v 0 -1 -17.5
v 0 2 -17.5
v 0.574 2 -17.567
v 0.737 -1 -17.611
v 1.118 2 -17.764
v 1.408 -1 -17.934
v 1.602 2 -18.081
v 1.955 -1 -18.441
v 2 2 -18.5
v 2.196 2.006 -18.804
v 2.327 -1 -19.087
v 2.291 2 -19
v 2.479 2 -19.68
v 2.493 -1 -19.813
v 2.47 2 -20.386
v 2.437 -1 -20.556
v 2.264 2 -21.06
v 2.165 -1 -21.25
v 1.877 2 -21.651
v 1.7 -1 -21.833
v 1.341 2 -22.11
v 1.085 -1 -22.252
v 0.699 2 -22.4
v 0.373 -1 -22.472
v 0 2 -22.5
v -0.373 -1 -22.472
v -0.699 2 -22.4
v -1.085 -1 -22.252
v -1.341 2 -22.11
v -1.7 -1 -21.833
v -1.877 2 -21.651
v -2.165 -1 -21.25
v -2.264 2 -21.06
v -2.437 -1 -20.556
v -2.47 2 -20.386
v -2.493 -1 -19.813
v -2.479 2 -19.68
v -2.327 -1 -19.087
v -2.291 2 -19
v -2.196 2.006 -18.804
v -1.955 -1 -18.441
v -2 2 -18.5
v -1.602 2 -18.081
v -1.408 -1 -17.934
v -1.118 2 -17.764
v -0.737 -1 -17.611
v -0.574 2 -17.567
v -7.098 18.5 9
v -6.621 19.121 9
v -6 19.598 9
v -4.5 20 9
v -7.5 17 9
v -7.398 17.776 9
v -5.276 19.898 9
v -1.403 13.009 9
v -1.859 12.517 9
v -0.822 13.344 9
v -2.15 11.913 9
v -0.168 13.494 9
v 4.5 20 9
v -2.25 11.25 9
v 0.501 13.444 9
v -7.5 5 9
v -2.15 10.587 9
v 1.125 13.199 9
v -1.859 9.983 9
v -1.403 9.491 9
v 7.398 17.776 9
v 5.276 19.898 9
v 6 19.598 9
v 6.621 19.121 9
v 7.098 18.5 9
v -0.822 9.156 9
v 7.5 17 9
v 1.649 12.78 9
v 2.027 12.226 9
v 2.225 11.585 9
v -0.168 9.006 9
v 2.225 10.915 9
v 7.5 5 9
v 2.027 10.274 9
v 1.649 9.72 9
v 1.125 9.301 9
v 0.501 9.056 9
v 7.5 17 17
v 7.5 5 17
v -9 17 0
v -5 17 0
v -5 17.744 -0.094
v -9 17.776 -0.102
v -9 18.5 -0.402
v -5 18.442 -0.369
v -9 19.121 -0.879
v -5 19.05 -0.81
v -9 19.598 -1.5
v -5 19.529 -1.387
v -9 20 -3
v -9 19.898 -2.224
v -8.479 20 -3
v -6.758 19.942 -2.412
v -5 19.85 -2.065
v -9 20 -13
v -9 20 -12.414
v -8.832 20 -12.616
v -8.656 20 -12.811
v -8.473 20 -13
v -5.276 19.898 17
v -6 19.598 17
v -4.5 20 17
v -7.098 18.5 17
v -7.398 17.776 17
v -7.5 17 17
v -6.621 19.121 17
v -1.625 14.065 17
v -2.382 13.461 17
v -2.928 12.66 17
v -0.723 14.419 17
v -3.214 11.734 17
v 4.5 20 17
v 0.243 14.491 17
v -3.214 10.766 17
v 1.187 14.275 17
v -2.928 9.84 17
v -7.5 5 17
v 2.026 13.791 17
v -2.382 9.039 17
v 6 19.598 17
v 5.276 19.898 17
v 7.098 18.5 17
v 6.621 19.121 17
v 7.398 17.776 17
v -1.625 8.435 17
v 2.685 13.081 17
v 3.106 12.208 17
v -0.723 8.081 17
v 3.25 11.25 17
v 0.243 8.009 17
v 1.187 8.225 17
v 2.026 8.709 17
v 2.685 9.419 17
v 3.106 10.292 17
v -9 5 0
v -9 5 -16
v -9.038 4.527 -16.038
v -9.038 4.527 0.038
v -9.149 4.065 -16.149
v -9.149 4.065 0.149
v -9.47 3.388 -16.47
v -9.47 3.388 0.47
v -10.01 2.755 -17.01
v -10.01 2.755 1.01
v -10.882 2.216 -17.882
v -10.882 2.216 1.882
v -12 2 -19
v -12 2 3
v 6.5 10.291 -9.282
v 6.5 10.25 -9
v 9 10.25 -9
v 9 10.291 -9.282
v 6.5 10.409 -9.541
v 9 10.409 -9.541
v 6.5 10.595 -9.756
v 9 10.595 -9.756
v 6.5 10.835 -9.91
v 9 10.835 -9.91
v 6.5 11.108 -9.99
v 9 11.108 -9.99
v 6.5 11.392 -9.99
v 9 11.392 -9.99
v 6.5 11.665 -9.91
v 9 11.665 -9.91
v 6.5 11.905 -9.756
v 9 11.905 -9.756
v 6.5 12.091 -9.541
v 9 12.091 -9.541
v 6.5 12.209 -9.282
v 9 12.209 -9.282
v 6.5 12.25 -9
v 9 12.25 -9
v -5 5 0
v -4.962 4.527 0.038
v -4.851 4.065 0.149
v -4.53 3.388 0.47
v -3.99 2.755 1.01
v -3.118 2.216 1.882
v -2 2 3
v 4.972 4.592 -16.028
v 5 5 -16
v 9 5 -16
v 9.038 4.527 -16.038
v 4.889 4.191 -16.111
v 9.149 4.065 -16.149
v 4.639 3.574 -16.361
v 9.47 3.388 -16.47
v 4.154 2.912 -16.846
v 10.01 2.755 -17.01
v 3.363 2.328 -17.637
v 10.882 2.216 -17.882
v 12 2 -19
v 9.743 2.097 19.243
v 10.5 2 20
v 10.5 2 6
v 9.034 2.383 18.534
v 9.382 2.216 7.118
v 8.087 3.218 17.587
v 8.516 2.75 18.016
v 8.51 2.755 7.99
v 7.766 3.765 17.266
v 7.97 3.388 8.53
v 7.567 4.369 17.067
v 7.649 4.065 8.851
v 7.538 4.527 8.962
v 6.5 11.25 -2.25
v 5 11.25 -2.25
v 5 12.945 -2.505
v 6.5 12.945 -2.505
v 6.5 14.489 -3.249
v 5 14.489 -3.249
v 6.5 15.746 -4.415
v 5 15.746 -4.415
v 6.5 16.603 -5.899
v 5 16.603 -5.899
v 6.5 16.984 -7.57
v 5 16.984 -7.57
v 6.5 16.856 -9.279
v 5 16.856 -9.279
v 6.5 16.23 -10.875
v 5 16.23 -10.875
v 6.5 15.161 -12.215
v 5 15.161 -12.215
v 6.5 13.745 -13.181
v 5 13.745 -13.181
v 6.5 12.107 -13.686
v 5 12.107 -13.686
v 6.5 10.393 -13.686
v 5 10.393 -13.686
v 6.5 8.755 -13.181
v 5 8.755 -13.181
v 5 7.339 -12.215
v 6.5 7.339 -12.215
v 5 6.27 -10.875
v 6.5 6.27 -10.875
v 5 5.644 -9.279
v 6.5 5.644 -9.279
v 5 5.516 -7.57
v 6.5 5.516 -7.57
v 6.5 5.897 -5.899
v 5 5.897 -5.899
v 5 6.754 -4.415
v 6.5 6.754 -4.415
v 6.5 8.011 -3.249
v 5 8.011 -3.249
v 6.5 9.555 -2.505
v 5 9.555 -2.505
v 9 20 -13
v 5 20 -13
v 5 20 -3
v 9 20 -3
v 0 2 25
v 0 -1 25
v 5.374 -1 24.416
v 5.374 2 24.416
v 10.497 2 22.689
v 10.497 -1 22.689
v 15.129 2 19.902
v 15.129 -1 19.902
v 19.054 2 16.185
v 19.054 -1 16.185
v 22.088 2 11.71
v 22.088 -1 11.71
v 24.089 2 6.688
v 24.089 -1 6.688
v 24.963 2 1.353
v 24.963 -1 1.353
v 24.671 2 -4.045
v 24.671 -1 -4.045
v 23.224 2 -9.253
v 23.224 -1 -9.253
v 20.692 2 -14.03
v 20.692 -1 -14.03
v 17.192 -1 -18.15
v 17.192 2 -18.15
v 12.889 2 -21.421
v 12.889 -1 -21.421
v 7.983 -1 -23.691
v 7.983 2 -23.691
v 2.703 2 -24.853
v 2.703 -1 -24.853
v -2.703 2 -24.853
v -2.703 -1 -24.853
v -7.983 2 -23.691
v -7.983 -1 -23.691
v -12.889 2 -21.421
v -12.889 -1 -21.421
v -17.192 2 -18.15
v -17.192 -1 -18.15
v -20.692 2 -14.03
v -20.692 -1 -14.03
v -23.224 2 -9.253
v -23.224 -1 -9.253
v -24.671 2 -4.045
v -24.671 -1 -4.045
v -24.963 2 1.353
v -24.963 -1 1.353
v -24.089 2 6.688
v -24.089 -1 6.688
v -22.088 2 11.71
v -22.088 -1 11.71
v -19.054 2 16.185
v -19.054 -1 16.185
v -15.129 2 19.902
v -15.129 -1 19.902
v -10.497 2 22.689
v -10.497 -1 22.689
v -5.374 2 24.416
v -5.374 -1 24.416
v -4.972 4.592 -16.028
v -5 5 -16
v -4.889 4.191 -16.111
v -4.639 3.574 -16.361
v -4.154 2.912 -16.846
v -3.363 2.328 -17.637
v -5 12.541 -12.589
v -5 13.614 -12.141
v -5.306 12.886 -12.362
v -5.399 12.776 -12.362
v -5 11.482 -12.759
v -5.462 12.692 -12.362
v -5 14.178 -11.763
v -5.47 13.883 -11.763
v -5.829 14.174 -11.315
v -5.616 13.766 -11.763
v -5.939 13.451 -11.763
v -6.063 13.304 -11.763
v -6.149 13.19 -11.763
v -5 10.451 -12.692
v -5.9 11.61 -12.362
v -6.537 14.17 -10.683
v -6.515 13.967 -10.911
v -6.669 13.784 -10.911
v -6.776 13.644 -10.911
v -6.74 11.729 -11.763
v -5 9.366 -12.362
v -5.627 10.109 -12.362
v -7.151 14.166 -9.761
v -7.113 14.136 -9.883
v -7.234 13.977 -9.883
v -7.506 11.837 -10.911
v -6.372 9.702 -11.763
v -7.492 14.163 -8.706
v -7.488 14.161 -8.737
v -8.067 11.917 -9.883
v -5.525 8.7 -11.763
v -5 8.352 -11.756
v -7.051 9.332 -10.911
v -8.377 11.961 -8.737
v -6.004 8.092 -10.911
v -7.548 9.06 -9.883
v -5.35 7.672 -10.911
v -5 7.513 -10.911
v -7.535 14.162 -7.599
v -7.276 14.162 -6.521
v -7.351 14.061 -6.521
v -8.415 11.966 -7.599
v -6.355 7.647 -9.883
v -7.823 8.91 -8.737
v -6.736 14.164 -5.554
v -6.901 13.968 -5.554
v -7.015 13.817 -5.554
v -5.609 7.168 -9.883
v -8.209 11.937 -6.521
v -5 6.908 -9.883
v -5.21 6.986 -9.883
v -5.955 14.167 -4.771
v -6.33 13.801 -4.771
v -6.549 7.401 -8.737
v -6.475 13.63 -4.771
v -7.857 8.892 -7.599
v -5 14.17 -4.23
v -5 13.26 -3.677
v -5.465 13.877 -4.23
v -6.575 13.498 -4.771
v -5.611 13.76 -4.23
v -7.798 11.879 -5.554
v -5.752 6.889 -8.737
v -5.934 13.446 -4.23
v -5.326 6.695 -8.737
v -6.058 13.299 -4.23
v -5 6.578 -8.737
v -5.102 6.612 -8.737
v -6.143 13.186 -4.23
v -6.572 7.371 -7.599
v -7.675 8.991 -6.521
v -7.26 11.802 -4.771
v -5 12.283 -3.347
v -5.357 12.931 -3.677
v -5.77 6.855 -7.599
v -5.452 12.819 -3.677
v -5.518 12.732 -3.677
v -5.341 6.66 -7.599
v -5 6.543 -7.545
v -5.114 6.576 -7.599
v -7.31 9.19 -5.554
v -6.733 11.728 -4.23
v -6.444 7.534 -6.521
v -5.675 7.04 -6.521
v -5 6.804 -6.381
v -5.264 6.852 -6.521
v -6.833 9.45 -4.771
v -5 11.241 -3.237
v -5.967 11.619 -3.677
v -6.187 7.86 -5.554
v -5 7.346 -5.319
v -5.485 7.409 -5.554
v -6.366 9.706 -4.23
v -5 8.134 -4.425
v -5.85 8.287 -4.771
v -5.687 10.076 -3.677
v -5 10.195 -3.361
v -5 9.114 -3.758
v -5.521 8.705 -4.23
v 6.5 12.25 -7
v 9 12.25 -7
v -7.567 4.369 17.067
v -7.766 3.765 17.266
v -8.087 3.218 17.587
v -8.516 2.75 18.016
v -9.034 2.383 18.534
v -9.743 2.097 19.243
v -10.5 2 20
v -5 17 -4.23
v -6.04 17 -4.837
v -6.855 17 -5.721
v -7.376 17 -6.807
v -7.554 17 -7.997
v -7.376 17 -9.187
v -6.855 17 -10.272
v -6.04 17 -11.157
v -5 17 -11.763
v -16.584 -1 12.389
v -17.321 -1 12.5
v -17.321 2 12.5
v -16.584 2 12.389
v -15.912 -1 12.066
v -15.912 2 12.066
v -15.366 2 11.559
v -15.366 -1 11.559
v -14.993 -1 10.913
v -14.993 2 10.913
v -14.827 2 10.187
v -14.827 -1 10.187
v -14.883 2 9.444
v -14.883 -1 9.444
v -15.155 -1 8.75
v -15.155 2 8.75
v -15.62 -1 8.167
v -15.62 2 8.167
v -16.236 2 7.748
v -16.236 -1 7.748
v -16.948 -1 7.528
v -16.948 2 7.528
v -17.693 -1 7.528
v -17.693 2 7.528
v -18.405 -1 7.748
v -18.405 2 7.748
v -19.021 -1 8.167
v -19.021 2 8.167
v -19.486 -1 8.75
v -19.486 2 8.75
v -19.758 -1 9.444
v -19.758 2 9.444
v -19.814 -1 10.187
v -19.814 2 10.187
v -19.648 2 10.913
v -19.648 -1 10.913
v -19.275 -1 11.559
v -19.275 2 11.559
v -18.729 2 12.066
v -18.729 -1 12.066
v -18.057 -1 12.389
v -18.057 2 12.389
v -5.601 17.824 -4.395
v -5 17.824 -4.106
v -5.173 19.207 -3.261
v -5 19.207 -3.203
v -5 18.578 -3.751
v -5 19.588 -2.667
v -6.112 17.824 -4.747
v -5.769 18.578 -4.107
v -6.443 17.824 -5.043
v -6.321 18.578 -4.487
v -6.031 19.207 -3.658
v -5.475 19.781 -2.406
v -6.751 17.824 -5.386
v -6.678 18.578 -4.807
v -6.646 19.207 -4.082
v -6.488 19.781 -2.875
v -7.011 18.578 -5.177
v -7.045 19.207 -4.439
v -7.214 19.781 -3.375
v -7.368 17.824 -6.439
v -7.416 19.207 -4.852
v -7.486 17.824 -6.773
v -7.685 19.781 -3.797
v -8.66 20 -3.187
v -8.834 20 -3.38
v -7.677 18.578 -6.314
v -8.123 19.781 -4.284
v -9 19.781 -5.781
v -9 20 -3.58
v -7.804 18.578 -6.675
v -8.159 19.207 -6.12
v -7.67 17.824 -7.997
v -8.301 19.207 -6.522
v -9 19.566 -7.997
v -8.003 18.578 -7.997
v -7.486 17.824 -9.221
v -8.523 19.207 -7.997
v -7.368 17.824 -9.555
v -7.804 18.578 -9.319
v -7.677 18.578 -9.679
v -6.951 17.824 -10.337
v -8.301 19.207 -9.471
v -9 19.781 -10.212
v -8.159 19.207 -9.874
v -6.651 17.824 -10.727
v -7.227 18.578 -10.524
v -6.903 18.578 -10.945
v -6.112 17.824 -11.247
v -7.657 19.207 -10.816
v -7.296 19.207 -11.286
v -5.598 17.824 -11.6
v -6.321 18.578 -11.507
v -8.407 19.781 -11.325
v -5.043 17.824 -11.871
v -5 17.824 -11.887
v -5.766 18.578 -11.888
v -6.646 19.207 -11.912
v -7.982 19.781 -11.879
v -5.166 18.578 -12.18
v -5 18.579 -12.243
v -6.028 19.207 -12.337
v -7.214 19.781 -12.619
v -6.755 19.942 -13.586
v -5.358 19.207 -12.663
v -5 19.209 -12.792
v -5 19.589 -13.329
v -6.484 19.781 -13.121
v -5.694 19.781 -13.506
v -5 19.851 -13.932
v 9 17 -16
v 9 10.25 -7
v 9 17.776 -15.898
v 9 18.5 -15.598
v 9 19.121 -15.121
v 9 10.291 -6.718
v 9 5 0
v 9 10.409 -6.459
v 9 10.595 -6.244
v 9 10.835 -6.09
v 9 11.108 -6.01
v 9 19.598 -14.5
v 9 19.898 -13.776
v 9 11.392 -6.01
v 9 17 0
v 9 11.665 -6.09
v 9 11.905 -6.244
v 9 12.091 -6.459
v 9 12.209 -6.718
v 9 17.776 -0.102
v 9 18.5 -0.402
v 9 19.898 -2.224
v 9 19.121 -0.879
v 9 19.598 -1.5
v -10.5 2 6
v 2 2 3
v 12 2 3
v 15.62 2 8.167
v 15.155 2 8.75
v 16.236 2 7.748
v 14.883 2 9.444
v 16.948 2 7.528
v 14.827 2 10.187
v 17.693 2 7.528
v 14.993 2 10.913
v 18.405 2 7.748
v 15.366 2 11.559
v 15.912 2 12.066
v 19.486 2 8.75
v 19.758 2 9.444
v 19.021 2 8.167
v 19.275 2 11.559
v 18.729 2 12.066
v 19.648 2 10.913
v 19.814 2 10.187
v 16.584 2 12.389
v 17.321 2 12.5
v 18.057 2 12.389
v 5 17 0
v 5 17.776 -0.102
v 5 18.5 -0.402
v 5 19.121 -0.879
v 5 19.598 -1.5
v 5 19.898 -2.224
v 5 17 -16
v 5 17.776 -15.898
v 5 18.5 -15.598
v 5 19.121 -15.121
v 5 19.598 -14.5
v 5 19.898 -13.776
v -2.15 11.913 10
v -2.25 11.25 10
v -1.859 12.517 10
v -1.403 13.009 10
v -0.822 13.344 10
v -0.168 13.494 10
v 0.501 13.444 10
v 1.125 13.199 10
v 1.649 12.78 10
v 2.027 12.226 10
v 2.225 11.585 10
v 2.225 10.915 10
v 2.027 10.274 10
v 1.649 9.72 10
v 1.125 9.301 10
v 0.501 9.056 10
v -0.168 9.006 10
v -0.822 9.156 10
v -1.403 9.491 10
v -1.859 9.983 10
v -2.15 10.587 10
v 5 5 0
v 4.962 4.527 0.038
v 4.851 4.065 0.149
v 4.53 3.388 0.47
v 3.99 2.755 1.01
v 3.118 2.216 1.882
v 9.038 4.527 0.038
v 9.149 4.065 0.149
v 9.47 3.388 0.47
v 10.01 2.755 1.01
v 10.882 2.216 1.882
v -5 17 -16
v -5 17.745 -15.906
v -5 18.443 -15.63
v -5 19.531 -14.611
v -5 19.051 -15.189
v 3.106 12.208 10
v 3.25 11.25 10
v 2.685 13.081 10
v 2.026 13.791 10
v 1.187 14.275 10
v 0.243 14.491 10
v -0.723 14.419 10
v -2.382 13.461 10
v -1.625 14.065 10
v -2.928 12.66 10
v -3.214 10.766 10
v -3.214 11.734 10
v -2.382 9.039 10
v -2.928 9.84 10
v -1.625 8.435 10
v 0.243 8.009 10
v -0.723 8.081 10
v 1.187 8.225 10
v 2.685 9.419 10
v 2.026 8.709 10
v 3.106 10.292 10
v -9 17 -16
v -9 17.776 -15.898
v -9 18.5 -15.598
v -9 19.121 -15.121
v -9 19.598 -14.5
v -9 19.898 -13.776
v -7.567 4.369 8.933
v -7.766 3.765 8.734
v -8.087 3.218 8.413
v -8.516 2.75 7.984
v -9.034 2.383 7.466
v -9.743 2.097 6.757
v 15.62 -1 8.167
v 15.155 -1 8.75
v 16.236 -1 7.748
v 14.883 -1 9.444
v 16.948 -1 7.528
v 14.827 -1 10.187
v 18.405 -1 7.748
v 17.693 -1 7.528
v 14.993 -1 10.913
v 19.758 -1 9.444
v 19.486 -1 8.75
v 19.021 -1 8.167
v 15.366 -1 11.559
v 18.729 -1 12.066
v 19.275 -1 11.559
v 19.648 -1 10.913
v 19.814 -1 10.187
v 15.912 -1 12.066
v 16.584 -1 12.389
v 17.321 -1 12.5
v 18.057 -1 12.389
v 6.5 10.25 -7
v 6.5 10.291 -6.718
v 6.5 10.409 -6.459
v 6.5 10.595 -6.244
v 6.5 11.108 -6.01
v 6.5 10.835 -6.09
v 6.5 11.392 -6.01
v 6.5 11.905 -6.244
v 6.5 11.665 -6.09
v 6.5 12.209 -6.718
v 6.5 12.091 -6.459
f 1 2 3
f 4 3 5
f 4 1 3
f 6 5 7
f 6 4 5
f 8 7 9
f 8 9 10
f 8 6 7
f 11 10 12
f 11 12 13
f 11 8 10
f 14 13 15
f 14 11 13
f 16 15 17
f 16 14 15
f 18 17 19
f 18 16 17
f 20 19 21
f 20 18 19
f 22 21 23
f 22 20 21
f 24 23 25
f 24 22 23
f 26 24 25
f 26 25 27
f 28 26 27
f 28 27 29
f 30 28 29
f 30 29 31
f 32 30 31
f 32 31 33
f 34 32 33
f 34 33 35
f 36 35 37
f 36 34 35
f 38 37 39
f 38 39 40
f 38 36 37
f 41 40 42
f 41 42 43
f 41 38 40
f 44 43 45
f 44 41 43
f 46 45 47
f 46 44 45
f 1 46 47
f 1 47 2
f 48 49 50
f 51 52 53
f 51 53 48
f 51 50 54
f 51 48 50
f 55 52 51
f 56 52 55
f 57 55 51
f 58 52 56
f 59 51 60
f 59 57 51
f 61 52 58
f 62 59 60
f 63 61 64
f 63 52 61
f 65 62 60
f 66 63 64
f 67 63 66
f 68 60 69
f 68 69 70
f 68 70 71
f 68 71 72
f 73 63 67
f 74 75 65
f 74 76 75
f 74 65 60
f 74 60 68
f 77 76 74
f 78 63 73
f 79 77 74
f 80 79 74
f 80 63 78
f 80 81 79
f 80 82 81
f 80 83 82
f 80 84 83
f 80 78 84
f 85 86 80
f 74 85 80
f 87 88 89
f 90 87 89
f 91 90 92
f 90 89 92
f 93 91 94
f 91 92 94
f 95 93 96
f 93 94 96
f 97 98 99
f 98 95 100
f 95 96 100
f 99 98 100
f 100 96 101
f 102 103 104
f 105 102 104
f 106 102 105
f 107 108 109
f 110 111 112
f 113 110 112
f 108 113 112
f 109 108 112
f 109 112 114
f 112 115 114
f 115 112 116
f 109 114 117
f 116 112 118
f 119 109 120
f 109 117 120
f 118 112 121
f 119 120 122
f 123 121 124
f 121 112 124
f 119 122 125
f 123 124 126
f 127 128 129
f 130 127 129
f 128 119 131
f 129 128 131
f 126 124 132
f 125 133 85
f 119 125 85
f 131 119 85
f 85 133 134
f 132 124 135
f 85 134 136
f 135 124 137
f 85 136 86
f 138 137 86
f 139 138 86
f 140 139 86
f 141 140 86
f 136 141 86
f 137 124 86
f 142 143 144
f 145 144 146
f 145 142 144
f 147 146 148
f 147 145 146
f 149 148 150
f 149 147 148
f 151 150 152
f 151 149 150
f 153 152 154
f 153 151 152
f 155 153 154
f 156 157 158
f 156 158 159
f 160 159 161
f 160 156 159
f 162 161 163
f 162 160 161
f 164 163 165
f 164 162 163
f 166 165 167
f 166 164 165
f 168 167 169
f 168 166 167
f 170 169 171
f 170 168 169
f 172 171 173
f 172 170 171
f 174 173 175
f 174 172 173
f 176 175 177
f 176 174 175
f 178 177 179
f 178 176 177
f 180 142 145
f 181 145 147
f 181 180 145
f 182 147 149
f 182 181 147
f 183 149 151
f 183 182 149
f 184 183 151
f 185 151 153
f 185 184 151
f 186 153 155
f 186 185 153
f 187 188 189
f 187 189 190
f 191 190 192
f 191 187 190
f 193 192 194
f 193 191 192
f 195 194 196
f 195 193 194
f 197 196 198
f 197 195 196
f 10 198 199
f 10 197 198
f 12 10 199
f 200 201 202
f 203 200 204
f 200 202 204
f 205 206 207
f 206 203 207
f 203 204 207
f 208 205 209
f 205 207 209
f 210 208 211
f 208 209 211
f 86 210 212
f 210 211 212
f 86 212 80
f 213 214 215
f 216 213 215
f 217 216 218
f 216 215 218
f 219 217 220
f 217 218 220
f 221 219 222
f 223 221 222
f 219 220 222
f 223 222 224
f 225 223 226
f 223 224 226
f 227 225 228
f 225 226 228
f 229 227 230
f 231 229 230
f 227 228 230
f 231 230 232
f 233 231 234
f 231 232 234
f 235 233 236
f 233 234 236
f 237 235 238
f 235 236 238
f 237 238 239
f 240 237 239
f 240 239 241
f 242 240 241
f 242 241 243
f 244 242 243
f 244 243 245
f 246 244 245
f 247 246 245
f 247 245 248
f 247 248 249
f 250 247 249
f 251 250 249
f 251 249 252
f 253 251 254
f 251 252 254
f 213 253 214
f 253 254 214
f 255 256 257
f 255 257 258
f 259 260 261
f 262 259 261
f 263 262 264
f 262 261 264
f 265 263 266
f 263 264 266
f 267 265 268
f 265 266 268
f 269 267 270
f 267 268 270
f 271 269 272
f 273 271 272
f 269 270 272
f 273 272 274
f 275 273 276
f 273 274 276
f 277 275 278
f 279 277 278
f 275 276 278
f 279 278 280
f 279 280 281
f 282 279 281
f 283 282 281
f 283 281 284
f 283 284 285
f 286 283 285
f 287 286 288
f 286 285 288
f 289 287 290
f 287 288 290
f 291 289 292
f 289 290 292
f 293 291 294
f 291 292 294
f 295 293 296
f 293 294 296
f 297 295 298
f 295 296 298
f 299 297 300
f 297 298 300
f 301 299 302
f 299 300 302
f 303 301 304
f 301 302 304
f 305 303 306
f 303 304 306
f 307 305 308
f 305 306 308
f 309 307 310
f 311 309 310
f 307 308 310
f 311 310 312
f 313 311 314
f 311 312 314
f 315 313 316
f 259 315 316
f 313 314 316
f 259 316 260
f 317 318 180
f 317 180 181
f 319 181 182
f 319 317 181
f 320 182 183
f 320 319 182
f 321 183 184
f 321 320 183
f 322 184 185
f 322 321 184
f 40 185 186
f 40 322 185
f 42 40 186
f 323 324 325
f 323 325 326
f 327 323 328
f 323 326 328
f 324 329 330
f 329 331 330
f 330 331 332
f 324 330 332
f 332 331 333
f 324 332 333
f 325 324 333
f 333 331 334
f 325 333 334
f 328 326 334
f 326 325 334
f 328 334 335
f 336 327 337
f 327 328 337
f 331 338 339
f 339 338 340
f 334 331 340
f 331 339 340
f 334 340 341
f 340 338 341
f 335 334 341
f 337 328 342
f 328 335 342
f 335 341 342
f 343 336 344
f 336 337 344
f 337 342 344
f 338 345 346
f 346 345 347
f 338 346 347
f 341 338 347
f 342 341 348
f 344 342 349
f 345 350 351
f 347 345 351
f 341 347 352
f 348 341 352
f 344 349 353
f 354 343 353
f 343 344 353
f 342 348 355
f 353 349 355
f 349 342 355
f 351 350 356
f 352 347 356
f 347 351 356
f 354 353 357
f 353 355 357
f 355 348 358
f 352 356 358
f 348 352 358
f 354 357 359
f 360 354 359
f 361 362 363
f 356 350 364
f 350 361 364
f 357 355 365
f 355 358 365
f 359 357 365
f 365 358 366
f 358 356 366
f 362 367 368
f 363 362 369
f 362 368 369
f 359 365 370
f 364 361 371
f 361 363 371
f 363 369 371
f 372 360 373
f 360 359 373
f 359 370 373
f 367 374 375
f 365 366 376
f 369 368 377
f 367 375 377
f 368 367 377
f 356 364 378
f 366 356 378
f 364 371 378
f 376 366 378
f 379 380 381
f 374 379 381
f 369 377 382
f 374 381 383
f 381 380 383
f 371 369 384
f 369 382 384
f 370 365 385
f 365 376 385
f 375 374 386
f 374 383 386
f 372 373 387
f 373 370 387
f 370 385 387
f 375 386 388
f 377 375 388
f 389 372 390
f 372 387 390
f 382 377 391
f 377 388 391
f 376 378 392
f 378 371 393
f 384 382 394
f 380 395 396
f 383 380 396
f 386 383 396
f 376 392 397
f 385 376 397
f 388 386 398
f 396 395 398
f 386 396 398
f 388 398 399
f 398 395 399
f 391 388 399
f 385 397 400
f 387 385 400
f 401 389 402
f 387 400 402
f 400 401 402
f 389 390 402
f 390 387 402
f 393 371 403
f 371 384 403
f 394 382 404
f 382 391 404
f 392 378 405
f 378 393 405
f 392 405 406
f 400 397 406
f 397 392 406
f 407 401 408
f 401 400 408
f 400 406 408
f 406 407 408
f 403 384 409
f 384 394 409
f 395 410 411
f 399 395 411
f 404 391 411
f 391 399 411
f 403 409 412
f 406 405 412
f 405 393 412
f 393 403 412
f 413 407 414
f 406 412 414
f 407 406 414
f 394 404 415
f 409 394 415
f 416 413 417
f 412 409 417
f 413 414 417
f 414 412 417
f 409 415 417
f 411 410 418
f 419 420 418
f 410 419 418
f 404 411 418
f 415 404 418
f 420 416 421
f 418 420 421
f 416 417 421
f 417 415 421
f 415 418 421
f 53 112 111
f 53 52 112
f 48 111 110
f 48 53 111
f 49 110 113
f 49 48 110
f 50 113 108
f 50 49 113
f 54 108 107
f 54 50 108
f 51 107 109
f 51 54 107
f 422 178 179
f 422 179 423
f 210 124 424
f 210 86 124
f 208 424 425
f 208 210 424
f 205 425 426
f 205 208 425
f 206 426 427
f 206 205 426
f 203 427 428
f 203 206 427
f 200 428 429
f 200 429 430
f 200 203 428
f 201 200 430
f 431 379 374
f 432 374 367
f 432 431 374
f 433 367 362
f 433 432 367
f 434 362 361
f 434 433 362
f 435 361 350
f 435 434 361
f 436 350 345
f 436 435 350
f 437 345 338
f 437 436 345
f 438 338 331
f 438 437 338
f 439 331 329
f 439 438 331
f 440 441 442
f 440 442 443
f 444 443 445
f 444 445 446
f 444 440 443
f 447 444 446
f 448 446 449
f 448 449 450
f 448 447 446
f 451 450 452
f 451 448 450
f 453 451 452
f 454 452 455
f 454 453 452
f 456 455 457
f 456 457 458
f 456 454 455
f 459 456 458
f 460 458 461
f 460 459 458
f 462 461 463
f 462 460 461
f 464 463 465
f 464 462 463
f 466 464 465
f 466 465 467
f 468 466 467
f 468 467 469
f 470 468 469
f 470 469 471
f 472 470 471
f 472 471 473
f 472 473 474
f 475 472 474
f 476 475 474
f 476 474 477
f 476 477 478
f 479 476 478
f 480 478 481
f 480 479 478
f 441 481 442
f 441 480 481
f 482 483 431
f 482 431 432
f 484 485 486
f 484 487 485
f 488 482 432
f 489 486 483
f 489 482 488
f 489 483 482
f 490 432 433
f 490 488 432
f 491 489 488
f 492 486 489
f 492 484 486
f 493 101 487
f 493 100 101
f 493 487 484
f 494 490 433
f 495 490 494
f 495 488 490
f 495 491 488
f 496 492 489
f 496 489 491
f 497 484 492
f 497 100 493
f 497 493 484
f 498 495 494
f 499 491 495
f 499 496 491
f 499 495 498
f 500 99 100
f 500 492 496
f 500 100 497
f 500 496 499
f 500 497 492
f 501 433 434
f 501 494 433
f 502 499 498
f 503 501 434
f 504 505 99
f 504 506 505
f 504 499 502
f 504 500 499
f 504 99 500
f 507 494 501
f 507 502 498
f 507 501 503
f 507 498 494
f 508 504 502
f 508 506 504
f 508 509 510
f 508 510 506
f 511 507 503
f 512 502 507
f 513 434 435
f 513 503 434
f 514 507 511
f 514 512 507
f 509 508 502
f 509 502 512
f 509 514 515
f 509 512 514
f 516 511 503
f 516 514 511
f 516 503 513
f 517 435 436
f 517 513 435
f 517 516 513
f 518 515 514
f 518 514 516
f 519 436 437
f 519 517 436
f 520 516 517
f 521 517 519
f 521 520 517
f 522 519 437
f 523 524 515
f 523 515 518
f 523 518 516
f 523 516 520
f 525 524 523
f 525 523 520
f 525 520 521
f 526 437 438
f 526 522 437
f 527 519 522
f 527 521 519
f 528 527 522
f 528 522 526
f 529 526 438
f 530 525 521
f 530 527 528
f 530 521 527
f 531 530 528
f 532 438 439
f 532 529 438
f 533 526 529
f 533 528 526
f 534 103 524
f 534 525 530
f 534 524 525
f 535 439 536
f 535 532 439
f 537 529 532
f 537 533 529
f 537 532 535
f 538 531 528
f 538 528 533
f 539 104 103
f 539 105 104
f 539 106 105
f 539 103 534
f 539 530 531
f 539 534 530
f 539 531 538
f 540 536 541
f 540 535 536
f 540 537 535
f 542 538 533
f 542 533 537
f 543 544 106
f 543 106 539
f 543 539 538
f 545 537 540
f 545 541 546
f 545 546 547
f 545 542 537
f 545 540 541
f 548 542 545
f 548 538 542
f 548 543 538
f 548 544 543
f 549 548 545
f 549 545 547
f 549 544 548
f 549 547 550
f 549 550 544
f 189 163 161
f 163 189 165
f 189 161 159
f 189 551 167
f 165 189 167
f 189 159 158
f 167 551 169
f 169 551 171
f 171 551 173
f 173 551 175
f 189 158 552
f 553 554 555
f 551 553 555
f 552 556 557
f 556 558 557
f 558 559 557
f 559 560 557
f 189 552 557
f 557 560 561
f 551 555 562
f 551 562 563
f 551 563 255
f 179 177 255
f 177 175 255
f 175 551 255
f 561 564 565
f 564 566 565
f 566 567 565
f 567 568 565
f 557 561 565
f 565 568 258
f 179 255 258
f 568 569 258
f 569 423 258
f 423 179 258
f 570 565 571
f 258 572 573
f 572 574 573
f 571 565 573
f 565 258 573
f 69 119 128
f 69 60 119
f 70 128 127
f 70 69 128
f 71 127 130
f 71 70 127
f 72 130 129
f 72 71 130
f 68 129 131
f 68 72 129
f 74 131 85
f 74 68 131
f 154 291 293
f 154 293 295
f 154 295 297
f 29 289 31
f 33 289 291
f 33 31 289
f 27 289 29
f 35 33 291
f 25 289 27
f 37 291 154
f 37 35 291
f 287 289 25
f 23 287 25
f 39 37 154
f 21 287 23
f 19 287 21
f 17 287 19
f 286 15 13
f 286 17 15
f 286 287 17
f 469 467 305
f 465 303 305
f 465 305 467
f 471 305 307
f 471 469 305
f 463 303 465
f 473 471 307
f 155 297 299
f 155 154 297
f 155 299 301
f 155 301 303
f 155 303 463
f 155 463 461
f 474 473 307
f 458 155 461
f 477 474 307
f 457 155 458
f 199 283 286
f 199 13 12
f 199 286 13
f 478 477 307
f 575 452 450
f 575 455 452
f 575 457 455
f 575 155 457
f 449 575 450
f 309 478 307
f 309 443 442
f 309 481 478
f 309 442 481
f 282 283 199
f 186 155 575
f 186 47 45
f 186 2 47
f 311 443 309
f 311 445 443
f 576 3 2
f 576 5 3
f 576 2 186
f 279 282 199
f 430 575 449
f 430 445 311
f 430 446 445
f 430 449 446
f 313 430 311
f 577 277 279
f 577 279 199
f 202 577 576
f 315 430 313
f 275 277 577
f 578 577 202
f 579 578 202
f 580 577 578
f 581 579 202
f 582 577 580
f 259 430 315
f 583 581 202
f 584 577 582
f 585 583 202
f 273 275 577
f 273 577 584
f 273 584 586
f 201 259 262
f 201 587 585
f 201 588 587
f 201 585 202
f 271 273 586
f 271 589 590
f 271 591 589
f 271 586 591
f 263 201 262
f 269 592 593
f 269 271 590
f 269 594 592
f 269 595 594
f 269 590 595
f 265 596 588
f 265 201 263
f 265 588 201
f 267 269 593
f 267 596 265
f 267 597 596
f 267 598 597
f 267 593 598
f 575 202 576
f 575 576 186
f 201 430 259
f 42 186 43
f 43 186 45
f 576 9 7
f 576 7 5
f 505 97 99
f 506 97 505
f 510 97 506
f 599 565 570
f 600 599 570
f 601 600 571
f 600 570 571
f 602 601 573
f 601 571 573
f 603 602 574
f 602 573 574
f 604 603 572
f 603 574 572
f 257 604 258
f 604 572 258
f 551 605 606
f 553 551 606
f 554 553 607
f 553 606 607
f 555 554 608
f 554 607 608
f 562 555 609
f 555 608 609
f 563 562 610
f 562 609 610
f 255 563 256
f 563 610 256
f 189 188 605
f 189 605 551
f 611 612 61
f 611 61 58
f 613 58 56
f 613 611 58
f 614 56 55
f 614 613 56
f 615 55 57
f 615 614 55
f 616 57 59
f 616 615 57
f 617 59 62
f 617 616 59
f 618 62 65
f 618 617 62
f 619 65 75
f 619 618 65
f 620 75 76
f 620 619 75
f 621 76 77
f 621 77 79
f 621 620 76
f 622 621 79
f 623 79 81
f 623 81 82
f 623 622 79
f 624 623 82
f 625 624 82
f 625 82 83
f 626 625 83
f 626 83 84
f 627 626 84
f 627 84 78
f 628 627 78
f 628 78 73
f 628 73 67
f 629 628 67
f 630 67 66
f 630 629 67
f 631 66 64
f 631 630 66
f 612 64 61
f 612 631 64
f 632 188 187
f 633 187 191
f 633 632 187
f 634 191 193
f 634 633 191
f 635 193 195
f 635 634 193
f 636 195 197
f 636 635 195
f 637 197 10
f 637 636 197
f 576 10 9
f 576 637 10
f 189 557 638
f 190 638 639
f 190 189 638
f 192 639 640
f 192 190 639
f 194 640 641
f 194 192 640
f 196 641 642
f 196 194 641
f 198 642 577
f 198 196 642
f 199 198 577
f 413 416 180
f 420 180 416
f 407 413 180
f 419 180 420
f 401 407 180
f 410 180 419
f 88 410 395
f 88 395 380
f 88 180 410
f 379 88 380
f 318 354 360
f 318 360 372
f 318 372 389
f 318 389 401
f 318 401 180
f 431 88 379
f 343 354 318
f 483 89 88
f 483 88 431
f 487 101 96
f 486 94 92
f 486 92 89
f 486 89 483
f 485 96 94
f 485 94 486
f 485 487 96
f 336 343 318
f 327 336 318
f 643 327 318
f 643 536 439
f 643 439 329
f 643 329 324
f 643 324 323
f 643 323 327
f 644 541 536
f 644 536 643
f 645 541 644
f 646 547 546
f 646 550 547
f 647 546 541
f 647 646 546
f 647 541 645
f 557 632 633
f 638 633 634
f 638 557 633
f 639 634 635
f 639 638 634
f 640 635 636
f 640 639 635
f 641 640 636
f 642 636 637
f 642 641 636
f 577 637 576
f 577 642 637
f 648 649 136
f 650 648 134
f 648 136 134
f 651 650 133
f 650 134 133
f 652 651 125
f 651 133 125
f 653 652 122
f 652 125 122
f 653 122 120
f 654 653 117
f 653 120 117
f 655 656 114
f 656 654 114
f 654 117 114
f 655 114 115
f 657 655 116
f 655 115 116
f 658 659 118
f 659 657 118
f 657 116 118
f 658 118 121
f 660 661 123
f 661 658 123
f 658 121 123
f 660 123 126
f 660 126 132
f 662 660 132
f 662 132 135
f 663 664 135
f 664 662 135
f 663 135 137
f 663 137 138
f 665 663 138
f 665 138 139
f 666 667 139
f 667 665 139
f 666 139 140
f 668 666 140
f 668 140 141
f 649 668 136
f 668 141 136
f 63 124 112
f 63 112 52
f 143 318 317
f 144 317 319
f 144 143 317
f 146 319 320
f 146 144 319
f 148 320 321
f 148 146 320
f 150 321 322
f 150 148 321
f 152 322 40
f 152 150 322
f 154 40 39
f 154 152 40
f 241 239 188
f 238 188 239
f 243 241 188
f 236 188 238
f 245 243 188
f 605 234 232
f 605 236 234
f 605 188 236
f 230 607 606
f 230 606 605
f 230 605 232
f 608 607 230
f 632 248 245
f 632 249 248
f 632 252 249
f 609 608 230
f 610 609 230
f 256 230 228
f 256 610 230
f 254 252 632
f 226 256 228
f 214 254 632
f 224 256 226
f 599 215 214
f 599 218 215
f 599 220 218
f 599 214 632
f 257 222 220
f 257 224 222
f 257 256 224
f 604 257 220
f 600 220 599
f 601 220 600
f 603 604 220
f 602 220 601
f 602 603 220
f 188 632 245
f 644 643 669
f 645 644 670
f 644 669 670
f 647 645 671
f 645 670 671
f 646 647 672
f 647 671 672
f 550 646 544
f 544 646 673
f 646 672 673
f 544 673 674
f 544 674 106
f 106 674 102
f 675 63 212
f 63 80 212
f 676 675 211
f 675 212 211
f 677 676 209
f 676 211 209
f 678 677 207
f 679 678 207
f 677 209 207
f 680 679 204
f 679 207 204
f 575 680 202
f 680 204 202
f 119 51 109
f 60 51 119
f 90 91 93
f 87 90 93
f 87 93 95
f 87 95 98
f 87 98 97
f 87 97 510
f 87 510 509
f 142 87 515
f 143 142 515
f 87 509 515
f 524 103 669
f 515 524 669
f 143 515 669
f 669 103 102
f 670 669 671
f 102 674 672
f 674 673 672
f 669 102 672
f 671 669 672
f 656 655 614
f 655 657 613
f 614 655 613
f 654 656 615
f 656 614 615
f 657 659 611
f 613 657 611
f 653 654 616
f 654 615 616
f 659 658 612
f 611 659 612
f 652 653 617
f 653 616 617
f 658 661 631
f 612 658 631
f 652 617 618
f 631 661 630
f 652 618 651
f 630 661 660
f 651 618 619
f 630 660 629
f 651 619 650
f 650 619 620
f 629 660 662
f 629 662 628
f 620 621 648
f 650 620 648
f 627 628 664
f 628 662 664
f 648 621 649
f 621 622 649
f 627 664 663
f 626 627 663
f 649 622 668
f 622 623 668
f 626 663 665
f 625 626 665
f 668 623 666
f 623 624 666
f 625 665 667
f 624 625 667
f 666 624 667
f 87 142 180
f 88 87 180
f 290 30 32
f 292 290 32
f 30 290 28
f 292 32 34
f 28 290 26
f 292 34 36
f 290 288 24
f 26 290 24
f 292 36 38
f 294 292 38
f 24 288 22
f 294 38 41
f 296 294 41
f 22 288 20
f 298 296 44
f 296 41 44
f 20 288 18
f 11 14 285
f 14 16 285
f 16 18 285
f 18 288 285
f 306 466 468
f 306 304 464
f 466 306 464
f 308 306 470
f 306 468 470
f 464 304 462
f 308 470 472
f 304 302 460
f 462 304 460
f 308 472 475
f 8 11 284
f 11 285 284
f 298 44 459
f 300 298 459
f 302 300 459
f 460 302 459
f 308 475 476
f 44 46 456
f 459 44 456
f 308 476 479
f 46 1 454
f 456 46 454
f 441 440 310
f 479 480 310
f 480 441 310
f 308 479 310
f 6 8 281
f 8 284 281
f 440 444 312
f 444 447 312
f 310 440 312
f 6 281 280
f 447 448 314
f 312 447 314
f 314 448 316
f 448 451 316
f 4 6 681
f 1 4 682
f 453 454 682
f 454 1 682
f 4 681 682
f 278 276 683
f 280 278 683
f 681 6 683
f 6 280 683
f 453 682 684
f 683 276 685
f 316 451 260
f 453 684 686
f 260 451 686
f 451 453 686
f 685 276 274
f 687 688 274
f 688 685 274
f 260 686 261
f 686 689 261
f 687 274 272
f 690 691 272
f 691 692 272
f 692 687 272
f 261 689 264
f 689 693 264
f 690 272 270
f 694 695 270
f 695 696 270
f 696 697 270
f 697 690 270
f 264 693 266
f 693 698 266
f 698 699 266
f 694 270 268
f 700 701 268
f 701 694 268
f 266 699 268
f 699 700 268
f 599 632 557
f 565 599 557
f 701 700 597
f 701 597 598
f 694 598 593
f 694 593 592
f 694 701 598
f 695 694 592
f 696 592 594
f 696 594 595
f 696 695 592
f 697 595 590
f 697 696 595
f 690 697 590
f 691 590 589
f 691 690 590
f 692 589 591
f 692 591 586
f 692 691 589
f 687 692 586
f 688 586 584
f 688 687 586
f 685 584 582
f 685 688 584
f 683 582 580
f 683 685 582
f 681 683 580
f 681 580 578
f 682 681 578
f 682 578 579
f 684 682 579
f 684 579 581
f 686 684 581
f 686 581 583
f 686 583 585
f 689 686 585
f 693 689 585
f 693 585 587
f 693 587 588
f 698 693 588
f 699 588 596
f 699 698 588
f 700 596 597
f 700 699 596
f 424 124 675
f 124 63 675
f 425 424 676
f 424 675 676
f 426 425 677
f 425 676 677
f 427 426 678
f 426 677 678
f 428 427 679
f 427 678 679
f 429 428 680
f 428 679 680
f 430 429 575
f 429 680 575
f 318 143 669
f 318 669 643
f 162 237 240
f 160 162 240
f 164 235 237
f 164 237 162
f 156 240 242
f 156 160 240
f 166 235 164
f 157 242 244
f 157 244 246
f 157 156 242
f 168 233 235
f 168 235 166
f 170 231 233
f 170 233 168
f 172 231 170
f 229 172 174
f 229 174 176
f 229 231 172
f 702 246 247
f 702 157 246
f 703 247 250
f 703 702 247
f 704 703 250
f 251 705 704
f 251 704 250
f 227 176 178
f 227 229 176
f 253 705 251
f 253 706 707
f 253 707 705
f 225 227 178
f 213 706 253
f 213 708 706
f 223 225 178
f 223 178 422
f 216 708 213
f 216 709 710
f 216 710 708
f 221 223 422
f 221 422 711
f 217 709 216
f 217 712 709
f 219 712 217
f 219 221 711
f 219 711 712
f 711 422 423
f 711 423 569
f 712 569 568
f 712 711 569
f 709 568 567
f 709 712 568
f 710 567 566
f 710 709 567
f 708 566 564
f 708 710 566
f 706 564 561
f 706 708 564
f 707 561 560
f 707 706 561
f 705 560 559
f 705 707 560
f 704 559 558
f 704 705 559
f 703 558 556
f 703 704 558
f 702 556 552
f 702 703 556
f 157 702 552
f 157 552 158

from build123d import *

# Parameters (mm, degrees)
BOSS_EXTRUDE1_DEPTH      = 2
BOSS_EXTRUDE1_DEPTH_BACK = 1
SKETCH1_R                = 25
SKETCH1_R_2              = 2.5
SKETCH2_W                = 4
SKETCH2_H                = 16
BOSS_EXTRUDE2_DEPTH      = 18
SKETCH3_R                = 5.75
CUT_EXTRUDE1_DEPTH       = 1.5
CUT_REVOLVE1_ANGLE       = 180
CUT_EXTRUDE2_REACH       = 43.122
CUT_EXTRUDE3_REACH       = 46.914
FILLET1_R                = 3
SKETCH7_W                = 15
SKETCH7_H                = 8
BOSS_EXTRUDE3_DEPTH      = 18
CUT_EXTRUDE4_REACH       = 54.811
SKETCH8_R                = 3.25
BOSS_EXTRUDE4_START      = -1
SKETCH9_R                = 3.25
SKETCH9_R_2              = 2.25
BOSS_EXTRUDE4_DEPTH      = 1
FILLET2_R                = 3


with BuildPart() as part:
    # Sketch1 → Boss-Extrude1 (new, two sides: drawn at the far end of the back side and taken through both)
    with BuildSketch(Plane(origin=(0, 0, 0), x_dir=(1, 0, 0), z_dir=(0, 1, 0)).offset(-BOSS_EXTRUDE1_DEPTH_BACK)):
        with Locations(Location((0, 0, 0), (0, 0, 270))):
            Circle(SKETCH1_R)
        with Locations(Location((0, 20, 0), (0, 0, 270))):
            Circle(SKETCH1_R_2, mode=Mode.SUBTRACT)
        with Locations(Location((17.320508076, -10, 0), (0, 0, 270))):
            Circle(SKETCH1_R_2, mode=Mode.SUBTRACT)
        with Locations(Location((-17.320508076, -10, 0), (0, 0, 270))):
            Circle(SKETCH1_R_2, mode=Mode.SUBTRACT)
    extrude(amount=BOSS_EXTRUDE1_DEPTH + BOSS_EXTRUDE1_DEPTH_BACK)

    # Sketch2 → Boss-Extrude2 (add)
    with BuildSketch(Plane(origin=(0, 2, 0), x_dir=(1, 0, 0), z_dir=(0, 1, 0))):
        with Locations((7, 8)):
            Rectangle(SKETCH2_W, SKETCH2_H)
        with Locations((-7, 8)):
            Rectangle(SKETCH2_W, SKETCH2_H)
    extrude(amount=BOSS_EXTRUDE2_DEPTH)

    # Sketch3 → Cut-Extrude1 (cut)
    with BuildSketch(Plane.ZY.offset(-5)):
        with Locations((-8, 11.25)):
            Circle(SKETCH3_R)
    extrude(amount=-CUT_EXTRUDE1_DEPTH, mode=Mode.SUBTRACT)

    # Sketch4 → Cut-Revolve1 (revolve, cut)
    with BuildSketch(Plane.ZY.offset(3.5)):
        with BuildLine():
            Line((-3.000039219, 11.269803747), (-12.999960781, 11.269803747))
            ThreePointArc((-12.999960781, 11.269803747), (-8, 16.25), (-3.000039219, 11.269803747))
        make_face()
    revolve(axis=Axis((-3.5, 11.269803747, -3.000039219), (0, 0, 1)), revolution_arc=CUT_REVOLVE1_ANGLE, mode=Mode.SUBTRACT)

    # Sketch5 → Cut-Extrude2 (cut, up to next)
    with BuildSketch(Plane(origin=(0, 20, 0), x_dir=(1, 0, 0), z_dir=(0, 1, 0)), mode=Mode.PRIVATE) as cut_extrude2_sk1:
        with BuildLine():
            Line((-5, 11.763417337), (-5, 4.230303993))
            ThreePointArc((-5, 4.230303993), (-7.554250753, 7.996860665), (-5, 11.763417337))
        make_face()
    cut_extrude2_tool1 = extrude(cut_extrude2_sk1.sketch, amount=-CUT_EXTRUDE2_REACH, mode=Mode.PRIVATE) & part.part
    add(cut_extrude2_tool1.solids().sort_by_distance((-6.055552, 20, -7.996861))[0], mode=Mode.SUBTRACT)

    # Sketch6 → Cut-Extrude3 (cut, up to next)
    with BuildSketch(Plane.ZY.offset(-6.5), mode=Mode.PRIVATE) as cut_extrude3_sk1:
        with BuildLine():
            Line((-9, 12.25), (-7, 12.25))
            ThreePointArc((-7, 12.25), (-6, 11.25), (-7, 10.25))
            Line((-7, 10.25), (-9, 10.25))
            ThreePointArc((-9, 10.25), (-10, 11.25), (-9, 12.25))
        make_face()
    cut_extrude3_tool1 = extrude(cut_extrude3_sk1.sketch, amount=-CUT_EXTRUDE3_REACH, mode=Mode.PRIVATE) & part.part
    add(cut_extrude3_tool1.solids().sort_by_distance((6.5, 11.25, -8))[0], mode=Mode.SUBTRACT)

    # Fillet1
    # the kernel refuses this fillet: 3 mm, written as the material it adds along each edge
    with BuildSketch(Plane(origin=(5, 2, -16), x_dir=(0, 0, -1), z_dir=(1, 0, 0)), Plane(origin=(-9, 2, -16), x_dir=(0, 0, -1), z_dir=(1, 0, 0)), Plane(origin=(9, 2, 0), x_dir=(0, 0, 1), z_dir=(-1, 0, 0)), Plane(origin=(-5, 2, 0), x_dir=(0, 0, 1), z_dir=(-1, 0, 0))) as fillet1_piece_1:
        with BuildLine():
            CenterArc((FILLET1_R, FILLET1_R), FILLET1_R, 180, 90)
            Line((0, FILLET1_R), (0, 0))
            Line((0, 0), (FILLET1_R, 0))
        make_face()
    extrude(amount=4)
    with BuildSketch(Plane(origin=(9, 2, -16), x_dir=(1, 0, 0), z_dir=(0, 0, 1)), Plane(origin=(5, 2, 0), x_dir=(-1, 0, 0), z_dir=(0, 0, -1)), Plane(origin=(-5, 2, -16), x_dir=(1, 0, 0), z_dir=(0, 0, 1)), Plane(origin=(-9, 2, 0), x_dir=(-1, 0, 0), z_dir=(0, 0, -1))) as fillet1_piece_2:
        with BuildLine():
            CenterArc((FILLET1_R, FILLET1_R), FILLET1_R, 180, 90)
            Line((0, FILLET1_R), (0, 0))
            Line((0, 0), (FILLET1_R, 0))
        make_face()
    extrude(amount=16)
    with BuildSketch(Plane(origin=(-2.5, 2, -16), x_dir=(0, 0, -1), z_dir=(1, 0, 0))) as fillet1_piece_3a_section:
        with BuildLine():
            CenterArc((FILLET1_R, FILLET1_R), FILLET1_R, 180, 90)
            Line((0, FILLET1_R), (0, 0))
            Line((0, 0), (FILLET1_R, 0))
        make_face()
    fillet1_piece_3a = extrude(amount=11.5, mode=Mode.PRIVATE)
    fillet1_piece_3a = fillet1_piece_3a - Plane(origin=(0, 2.708264554, -20), x_dir=(0, 0, 1), z_dir=(0, -1, 0)) * Cylinder(2.5, 35, mode=Mode.PRIVATE)
    fillet1_piece_3a = split(fillet1_piece_3a, bisect_by=Plane(origin=(5, 2.708264554, -16.611938718), z_dir=(-1, 0, 0)), keep=Keep.TOP, mode=Mode.PRIVATE)
    with BuildSketch(Plane(origin=(5, 2, 0), x_dir=(-1, 0, 0), z_dir=(0, 0, -1))) as fillet1_piece_3b_section:
        with BuildLine():
            CenterArc((FILLET1_R, FILLET1_R), FILLET1_R, 180, 90)
            Line((0, FILLET1_R), (0, 0))
            Line((0, 0), (FILLET1_R, 0))
        make_face()
    fillet1_piece_3b = extrude(amount=23.5, mode=Mode.PRIVATE)
    fillet1_piece_3b = fillet1_piece_3b - Plane(origin=(0, 2.682108515, -20), x_dir=(0, 0, 1), z_dir=(0, -1, 0)) * Cylinder(2.5, 59, mode=Mode.PRIVATE)
    fillet1_piece_3b = split(fillet1_piece_3b, bisect_by=Plane(origin=(4.329541602, 2.682108515, -16), z_dir=(0, 0, -1)), keep=Keep.TOP, mode=Mode.PRIVATE)
    fillet1_piece_3 = fillet1_piece_3a & fillet1_piece_3b
    add(fillet1_piece_3)
    with BuildSketch(Plane(origin=(9, 2, -23.5), x_dir=(1, 0, 0), z_dir=(0, 0, 1))) as fillet1_piece_4a_section:
        with BuildLine():
            CenterArc((FILLET1_R, FILLET1_R), FILLET1_R, 180, 90)
            Line((0, FILLET1_R), (0, 0))
            Line((0, 0), (FILLET1_R, 0))
        make_face()
    fillet1_piece_4a = extrude(amount=23.5, mode=Mode.PRIVATE)
    fillet1_piece_4a = fillet1_piece_4a & Plane(origin=(0, 2.69431261, 0), x_dir=(0, 0, 1), z_dir=(0, -1, 0)) * Cylinder(25, 59, mode=Mode.PRIVATE)
    fillet1_piece_4a = split(fillet1_piece_4a, bisect_by=Plane(origin=(9.653084962, 2.69431261, -16), z_dir=(0, 0, -1)), keep=Keep.TOP, mode=Mode.PRIVATE)
    with BuildSketch(Plane(origin=(5, 2, -16), x_dir=(0, 0, -1), z_dir=(1, 0, 0))) as fillet1_piece_4b_section:
        with BuildLine():
            CenterArc((FILLET1_R, FILLET1_R), FILLET1_R, 180, 90)
            Line((0, FILLET1_R), (0, 0))
            Line((0, 0), (FILLET1_R, 0))
        make_face()
    fillet1_piece_4b = extrude(amount=11.5, mode=Mode.PRIVATE)
    fillet1_piece_4b = fillet1_piece_4b & Plane(origin=(0, 2.679254462, 0), x_dir=(0, 0, 1), z_dir=(0, -1, 0)) * Cylinder(25, 35, mode=Mode.PRIVATE)
    fillet1_piece_4b = split(fillet1_piece_4b, bisect_by=Plane(origin=(9, 2.679254462, -16.678966139), z_dir=(1, 0, 0)), keep=Keep.TOP, mode=Mode.PRIVATE)
    fillet1_piece_4 = fillet1_piece_4a & fillet1_piece_4b
    add(fillet1_piece_4)
    with BuildSketch(Plane(origin=(9, 2, -16), x_dir=(1, 0, 0), z_dir=(0, 0, 1))) as fillet1_piece_5a_section:
        with BuildLine():
            CenterArc((FILLET1_R, FILLET1_R), FILLET1_R, 180, 90)
            Line((0, FILLET1_R), (0, 0))
            Line((0, 0), (FILLET1_R, 0))
        make_face()
    fillet1_piece_5a = extrude(amount=23.5, mode=Mode.PRIVATE)
    fillet1_piece_5a = split(fillet1_piece_5a, bisect_by=Plane(origin=(9.679185343, 2.679185343, 0), z_dir=(0, 0, 1)), keep=Keep.TOP, mode=Mode.PRIVATE)
    with BuildSketch(Plane(origin=(16.5, 2, 0), x_dir=(0, 0, 1), z_dir=(-1, 0, 0))) as fillet1_piece_5b_section:
        with BuildLine():
            CenterArc((FILLET1_R, FILLET1_R), FILLET1_R, 180, 90)
            Line((0, FILLET1_R), (0, 0))
            Line((0, 0), (FILLET1_R, 0))
        make_face()
    fillet1_piece_5b = extrude(amount=11.5, mode=Mode.PRIVATE)
    fillet1_piece_5b = split(fillet1_piece_5b, bisect_by=Plane(origin=(9, 2.679185343, 0.679185343), z_dir=(1, 0, 0)), keep=Keep.TOP, mode=Mode.PRIVATE)
    fillet1_piece_5 = fillet1_piece_5a & fillet1_piece_5b
    add(fillet1_piece_5)
    with BuildSketch(Plane(origin=(5, 2, 7.5), x_dir=(-1, 0, 0), z_dir=(0, 0, -1))) as fillet1_piece_6a_section:
        with BuildLine():
            CenterArc((FILLET1_R, FILLET1_R), FILLET1_R, 180, 90)
            Line((0, FILLET1_R), (0, 0))
            Line((0, 0), (FILLET1_R, 0))
        make_face()
    fillet1_piece_6a = extrude(amount=23.5, mode=Mode.PRIVATE)
    fillet1_piece_6a = split(fillet1_piece_6a, bisect_by=Plane(origin=(4.320814657, 2.679185343, 0), z_dir=(0, 0, 1)), keep=Keep.TOP, mode=Mode.PRIVATE)
    with BuildSketch(Plane(origin=(9, 2, 0), x_dir=(0, 0, 1), z_dir=(-1, 0, 0))) as fillet1_piece_6b_section:
        with BuildLine():
            CenterArc((FILLET1_R, FILLET1_R), FILLET1_R, 180, 90)
            Line((0, FILLET1_R), (0, 0))
            Line((0, 0), (FILLET1_R, 0))
        make_face()
    fillet1_piece_6b = extrude(amount=11.5, mode=Mode.PRIVATE)
    fillet1_piece_6b = split(fillet1_piece_6b, bisect_by=Plane(origin=(5, 2.679185343, 0.679185343), z_dir=(-1, 0, 0)), keep=Keep.TOP, mode=Mode.PRIVATE)
    fillet1_piece_6 = fillet1_piece_6a & fillet1_piece_6b
    add(fillet1_piece_6)
    with BuildSketch(Plane(origin=(-9, 2, 0), x_dir=(-1, 0, 0), z_dir=(0, 0, -1))) as fillet1_piece_7a_section:
        with BuildLine():
            CenterArc((FILLET1_R, FILLET1_R), FILLET1_R, 180, 90)
            Line((0, FILLET1_R), (0, 0))
            Line((0, 0), (FILLET1_R, 0))
        make_face()
    fillet1_piece_7a = extrude(amount=23.5, mode=Mode.PRIVATE)
    fillet1_piece_7a = fillet1_piece_7a & Plane(origin=(0, 2.694311591, 0), x_dir=(0, 0, 1), z_dir=(0, -1, 0)) * Cylinder(25, 59, mode=Mode.PRIVATE)
    fillet1_piece_7a = split(fillet1_piece_7a, bisect_by=Plane(origin=(-9.653081328, 2.694311591, -16), z_dir=(0, 0, -1)), keep=Keep.TOP, mode=Mode.PRIVATE)
    with BuildSketch(Plane(origin=(-16.5, 2, -16), x_dir=(0, 0, -1), z_dir=(1, 0, 0))) as fillet1_piece_7b_section:
        with BuildLine():
            CenterArc((FILLET1_R, FILLET1_R), FILLET1_R, 180, 90)
            Line((0, FILLET1_R), (0, 0))
            Line((0, 0), (FILLET1_R, 0))
        make_face()
    fillet1_piece_7b = extrude(amount=11.5, mode=Mode.PRIVATE)
    fillet1_piece_7b = fillet1_piece_7b & Plane(origin=(0, 2.679254462, 0), x_dir=(0, 0, 1), z_dir=(0, -1, 0)) * Cylinder(25, 35, mode=Mode.PRIVATE)
    fillet1_piece_7b = split(fillet1_piece_7b, bisect_by=Plane(origin=(-9, 2.679254462, -16.678966139), z_dir=(-1, 0, 0)), keep=Keep.TOP, mode=Mode.PRIVATE)
    fillet1_piece_7 = fillet1_piece_7a & fillet1_piece_7b
    add(fillet1_piece_7)
    with BuildSketch(Plane(origin=(-5, 2, -23.5), x_dir=(1, 0, 0), z_dir=(0, 0, 1))) as fillet1_piece_8a_section:
        with BuildLine():
            CenterArc((FILLET1_R, FILLET1_R), FILLET1_R, 180, 90)
            Line((0, FILLET1_R), (0, 0))
            Line((0, 0), (FILLET1_R, 0))
        make_face()
    fillet1_piece_8a = extrude(amount=23.5, mode=Mode.PRIVATE)
    fillet1_piece_8a = fillet1_piece_8a - Plane(origin=(0, 2.682108515, -20), x_dir=(0, 0, 1), z_dir=(0, -1, 0)) * Cylinder(2.5, 59, mode=Mode.PRIVATE)
    fillet1_piece_8a = split(fillet1_piece_8a, bisect_by=Plane(origin=(-4.329541602, 2.682108515, -16), z_dir=(0, 0, -1)), keep=Keep.TOP, mode=Mode.PRIVATE)
    with BuildSketch(Plane(origin=(-9, 2, -16), x_dir=(0, 0, -1), z_dir=(1, 0, 0))) as fillet1_piece_8b_section:
        with BuildLine():
            CenterArc((FILLET1_R, FILLET1_R), FILLET1_R, 180, 90)
            Line((0, FILLET1_R), (0, 0))
            Line((0, 0), (FILLET1_R, 0))
        make_face()
    fillet1_piece_8b = extrude(amount=11.5, mode=Mode.PRIVATE)
    fillet1_piece_8b = fillet1_piece_8b - Plane(origin=(0, 2.708264539, -20), x_dir=(0, 0, 1), z_dir=(0, -1, 0)) * Cylinder(2.5, 35, mode=Mode.PRIVATE)
    fillet1_piece_8b = split(fillet1_piece_8b, bisect_by=Plane(origin=(-5, 2.708264539, -16.61193878), z_dir=(1, 0, 0)), keep=Keep.TOP, mode=Mode.PRIVATE)
    fillet1_piece_8 = fillet1_piece_8a & fillet1_piece_8b
    add(fillet1_piece_8)
    with BuildSketch(Plane(origin=(2.5, 2, 0), x_dir=(0, 0, 1), z_dir=(-1, 0, 0))) as fillet1_piece_9a_section:
        with BuildLine():
            CenterArc((FILLET1_R, FILLET1_R), FILLET1_R, 180, 90)
            Line((0, FILLET1_R), (0, 0))
            Line((0, 0), (FILLET1_R, 0))
        make_face()
    fillet1_piece_9a = extrude(amount=11.5, mode=Mode.PRIVATE)
    fillet1_piece_9a = split(fillet1_piece_9a, bisect_by=Plane(origin=(-5, 2.679185343, 0.679185343), z_dir=(1, 0, 0)), keep=Keep.TOP, mode=Mode.PRIVATE)
    with BuildSketch(Plane(origin=(-5, 2, -16), x_dir=(1, 0, 0), z_dir=(0, 0, 1))) as fillet1_piece_9b_section:
        with BuildLine():
            CenterArc((FILLET1_R, FILLET1_R), FILLET1_R, 180, 90)
            Line((0, FILLET1_R), (0, 0))
            Line((0, 0), (FILLET1_R, 0))
        make_face()
    fillet1_piece_9b = extrude(amount=23.5, mode=Mode.PRIVATE)
    fillet1_piece_9b = split(fillet1_piece_9b, bisect_by=Plane(origin=(-4.320814657, 2.679185343, 0), z_dir=(0, 0, 1)), keep=Keep.TOP, mode=Mode.PRIVATE)
    fillet1_piece_9 = fillet1_piece_9a & fillet1_piece_9b
    add(fillet1_piece_9)
    with BuildSketch(Plane(origin=(-9, 2, 7.5), x_dir=(-1, 0, 0), z_dir=(0, 0, -1))) as fillet1_piece_10a_section:
        with BuildLine():
            CenterArc((FILLET1_R, FILLET1_R), FILLET1_R, 180, 90)
            Line((0, FILLET1_R), (0, 0))
            Line((0, 0), (FILLET1_R, 0))
        make_face()
    fillet1_piece_10a = extrude(amount=23.5, mode=Mode.PRIVATE)
    fillet1_piece_10a = split(fillet1_piece_10a, bisect_by=Plane(origin=(-9.679185343, 2.679185343, 0), z_dir=(0, 0, 1)), keep=Keep.TOP, mode=Mode.PRIVATE)
    with BuildSketch(Plane(origin=(-5, 2, 0), x_dir=(0, 0, 1), z_dir=(-1, 0, 0))) as fillet1_piece_10b_section:
        with BuildLine():
            CenterArc((FILLET1_R, FILLET1_R), FILLET1_R, 180, 90)
            Line((0, FILLET1_R), (0, 0))
            Line((0, 0), (FILLET1_R, 0))
        make_face()
    fillet1_piece_10b = extrude(amount=11.5, mode=Mode.PRIVATE)
    fillet1_piece_10b = split(fillet1_piece_10b, bisect_by=Plane(origin=(-9, 2.679185343, 0.679185343), z_dir=(-1, 0, 0)), keep=Keep.TOP, mode=Mode.PRIVATE)
    fillet1_piece_10 = fillet1_piece_10a & fillet1_piece_10b
    add(fillet1_piece_10)
    # the kernel refuses this fillet: 3 mm, written as the material it takes off along each edge
    with BuildSketch(Plane(origin=(-3.5, 20, -7.996860665), x_dir=(0.9951857838683703, 0, 0.09800640584317669), z_dir=(0.09800640584317669, 0, -0.9951857838683703))) as fillet1_2_piece_1:
        with BuildLine():
            CenterArc((4.054250753 + FILLET1_R, FILLET1_R), FILLET1_R, 180, 90)
            Line((4.054250753, FILLET1_R), (4.054250753, 0))
            Line((4.054250753, 0), (4.054250753 + FILLET1_R, 0))
        make_face()
    revolve(axis=Axis((-3.5, 20, -7.996860665), (0, -1, 0)), revolution_arc=348.751236033, mode=Mode.SUBTRACT)
    with BuildSketch(Plane(origin=(-16.5, 20, -16), x_dir=(0, -1, 0), z_dir=(1, 0, 0)), Plane(origin=(2.5, 20, 0), x_dir=(0, -1, 0), z_dir=(-1, 0, 0)), Plane(origin=(-2.5, 20, -16), x_dir=(0, -1, 0), z_dir=(1, 0, 0)), Plane(origin=(16.5, 20, 0), x_dir=(0, -1, 0), z_dir=(-1, 0, 0))) as fillet1_2_piece_2:
        with BuildLine():
            CenterArc((FILLET1_R, -FILLET1_R), FILLET1_R, 90, 90)
            Line((0, -FILLET1_R), (0, 0))
            Line((0, 0), (FILLET1_R, 0))
        make_face()
    extrude(amount=19, mode=Mode.SUBTRACT)

    # Sketch7 → Boss-Extrude3 (add)
    with BuildSketch(Plane(origin=(0, 2, 0), x_dir=(1, 0, 0), z_dir=(0, 1, 0))):
        with Locations((0, -13)):
            Rectangle(SKETCH7_W, SKETCH7_H)
    extrude(amount=BOSS_EXTRUDE3_DEPTH)

    # Sketch8 → Cut-Extrude4 (cut, up to next)
    with BuildSketch(Plane.XY.offset(17), mode=Mode.PRIVATE) as cut_extrude4_sk1:
        with Locations((0, 11.25)):
            Circle(SKETCH8_R)
    cut_extrude4_tool1 = extrude(cut_extrude4_sk1.sketch, amount=-CUT_EXTRUDE4_REACH, mode=Mode.PRIVATE) & part.part
    add(cut_extrude4_tool1.solids().sort_by_distance((0, 11.25, 17))[0], mode=Mode.SUBTRACT)

    # Sketch9 → Boss-Extrude4 (add)
    with BuildSketch(Plane(origin=(0, 0, 9), x_dir=(-1, 0, 0), z_dir=(0, 0, -1)).offset(BOSS_EXTRUDE4_START)):
        with Locations(Location((0, 11.25, 0), (0, 0, 180))):
            Circle(SKETCH9_R)
        with Locations((0, 11.25)):
            Circle(SKETCH9_R_2, mode=Mode.SUBTRACT)
    extrude(amount=BOSS_EXTRUDE4_DEPTH)

    # Fillet2
    fillet2_edges = [part.edges().sort_by_distance(p)[0] for p in [
        (-7.5, 2, 13),
        (0, 2, 17),
        (7.5, 2, 13),
        (0, 2, 9),
        (-7.5, 20, 13),
        (7.5, 20, 13),
    ]]
    fillet(fillet2_edges, radius=FILLET2_R)


solid = part.part
